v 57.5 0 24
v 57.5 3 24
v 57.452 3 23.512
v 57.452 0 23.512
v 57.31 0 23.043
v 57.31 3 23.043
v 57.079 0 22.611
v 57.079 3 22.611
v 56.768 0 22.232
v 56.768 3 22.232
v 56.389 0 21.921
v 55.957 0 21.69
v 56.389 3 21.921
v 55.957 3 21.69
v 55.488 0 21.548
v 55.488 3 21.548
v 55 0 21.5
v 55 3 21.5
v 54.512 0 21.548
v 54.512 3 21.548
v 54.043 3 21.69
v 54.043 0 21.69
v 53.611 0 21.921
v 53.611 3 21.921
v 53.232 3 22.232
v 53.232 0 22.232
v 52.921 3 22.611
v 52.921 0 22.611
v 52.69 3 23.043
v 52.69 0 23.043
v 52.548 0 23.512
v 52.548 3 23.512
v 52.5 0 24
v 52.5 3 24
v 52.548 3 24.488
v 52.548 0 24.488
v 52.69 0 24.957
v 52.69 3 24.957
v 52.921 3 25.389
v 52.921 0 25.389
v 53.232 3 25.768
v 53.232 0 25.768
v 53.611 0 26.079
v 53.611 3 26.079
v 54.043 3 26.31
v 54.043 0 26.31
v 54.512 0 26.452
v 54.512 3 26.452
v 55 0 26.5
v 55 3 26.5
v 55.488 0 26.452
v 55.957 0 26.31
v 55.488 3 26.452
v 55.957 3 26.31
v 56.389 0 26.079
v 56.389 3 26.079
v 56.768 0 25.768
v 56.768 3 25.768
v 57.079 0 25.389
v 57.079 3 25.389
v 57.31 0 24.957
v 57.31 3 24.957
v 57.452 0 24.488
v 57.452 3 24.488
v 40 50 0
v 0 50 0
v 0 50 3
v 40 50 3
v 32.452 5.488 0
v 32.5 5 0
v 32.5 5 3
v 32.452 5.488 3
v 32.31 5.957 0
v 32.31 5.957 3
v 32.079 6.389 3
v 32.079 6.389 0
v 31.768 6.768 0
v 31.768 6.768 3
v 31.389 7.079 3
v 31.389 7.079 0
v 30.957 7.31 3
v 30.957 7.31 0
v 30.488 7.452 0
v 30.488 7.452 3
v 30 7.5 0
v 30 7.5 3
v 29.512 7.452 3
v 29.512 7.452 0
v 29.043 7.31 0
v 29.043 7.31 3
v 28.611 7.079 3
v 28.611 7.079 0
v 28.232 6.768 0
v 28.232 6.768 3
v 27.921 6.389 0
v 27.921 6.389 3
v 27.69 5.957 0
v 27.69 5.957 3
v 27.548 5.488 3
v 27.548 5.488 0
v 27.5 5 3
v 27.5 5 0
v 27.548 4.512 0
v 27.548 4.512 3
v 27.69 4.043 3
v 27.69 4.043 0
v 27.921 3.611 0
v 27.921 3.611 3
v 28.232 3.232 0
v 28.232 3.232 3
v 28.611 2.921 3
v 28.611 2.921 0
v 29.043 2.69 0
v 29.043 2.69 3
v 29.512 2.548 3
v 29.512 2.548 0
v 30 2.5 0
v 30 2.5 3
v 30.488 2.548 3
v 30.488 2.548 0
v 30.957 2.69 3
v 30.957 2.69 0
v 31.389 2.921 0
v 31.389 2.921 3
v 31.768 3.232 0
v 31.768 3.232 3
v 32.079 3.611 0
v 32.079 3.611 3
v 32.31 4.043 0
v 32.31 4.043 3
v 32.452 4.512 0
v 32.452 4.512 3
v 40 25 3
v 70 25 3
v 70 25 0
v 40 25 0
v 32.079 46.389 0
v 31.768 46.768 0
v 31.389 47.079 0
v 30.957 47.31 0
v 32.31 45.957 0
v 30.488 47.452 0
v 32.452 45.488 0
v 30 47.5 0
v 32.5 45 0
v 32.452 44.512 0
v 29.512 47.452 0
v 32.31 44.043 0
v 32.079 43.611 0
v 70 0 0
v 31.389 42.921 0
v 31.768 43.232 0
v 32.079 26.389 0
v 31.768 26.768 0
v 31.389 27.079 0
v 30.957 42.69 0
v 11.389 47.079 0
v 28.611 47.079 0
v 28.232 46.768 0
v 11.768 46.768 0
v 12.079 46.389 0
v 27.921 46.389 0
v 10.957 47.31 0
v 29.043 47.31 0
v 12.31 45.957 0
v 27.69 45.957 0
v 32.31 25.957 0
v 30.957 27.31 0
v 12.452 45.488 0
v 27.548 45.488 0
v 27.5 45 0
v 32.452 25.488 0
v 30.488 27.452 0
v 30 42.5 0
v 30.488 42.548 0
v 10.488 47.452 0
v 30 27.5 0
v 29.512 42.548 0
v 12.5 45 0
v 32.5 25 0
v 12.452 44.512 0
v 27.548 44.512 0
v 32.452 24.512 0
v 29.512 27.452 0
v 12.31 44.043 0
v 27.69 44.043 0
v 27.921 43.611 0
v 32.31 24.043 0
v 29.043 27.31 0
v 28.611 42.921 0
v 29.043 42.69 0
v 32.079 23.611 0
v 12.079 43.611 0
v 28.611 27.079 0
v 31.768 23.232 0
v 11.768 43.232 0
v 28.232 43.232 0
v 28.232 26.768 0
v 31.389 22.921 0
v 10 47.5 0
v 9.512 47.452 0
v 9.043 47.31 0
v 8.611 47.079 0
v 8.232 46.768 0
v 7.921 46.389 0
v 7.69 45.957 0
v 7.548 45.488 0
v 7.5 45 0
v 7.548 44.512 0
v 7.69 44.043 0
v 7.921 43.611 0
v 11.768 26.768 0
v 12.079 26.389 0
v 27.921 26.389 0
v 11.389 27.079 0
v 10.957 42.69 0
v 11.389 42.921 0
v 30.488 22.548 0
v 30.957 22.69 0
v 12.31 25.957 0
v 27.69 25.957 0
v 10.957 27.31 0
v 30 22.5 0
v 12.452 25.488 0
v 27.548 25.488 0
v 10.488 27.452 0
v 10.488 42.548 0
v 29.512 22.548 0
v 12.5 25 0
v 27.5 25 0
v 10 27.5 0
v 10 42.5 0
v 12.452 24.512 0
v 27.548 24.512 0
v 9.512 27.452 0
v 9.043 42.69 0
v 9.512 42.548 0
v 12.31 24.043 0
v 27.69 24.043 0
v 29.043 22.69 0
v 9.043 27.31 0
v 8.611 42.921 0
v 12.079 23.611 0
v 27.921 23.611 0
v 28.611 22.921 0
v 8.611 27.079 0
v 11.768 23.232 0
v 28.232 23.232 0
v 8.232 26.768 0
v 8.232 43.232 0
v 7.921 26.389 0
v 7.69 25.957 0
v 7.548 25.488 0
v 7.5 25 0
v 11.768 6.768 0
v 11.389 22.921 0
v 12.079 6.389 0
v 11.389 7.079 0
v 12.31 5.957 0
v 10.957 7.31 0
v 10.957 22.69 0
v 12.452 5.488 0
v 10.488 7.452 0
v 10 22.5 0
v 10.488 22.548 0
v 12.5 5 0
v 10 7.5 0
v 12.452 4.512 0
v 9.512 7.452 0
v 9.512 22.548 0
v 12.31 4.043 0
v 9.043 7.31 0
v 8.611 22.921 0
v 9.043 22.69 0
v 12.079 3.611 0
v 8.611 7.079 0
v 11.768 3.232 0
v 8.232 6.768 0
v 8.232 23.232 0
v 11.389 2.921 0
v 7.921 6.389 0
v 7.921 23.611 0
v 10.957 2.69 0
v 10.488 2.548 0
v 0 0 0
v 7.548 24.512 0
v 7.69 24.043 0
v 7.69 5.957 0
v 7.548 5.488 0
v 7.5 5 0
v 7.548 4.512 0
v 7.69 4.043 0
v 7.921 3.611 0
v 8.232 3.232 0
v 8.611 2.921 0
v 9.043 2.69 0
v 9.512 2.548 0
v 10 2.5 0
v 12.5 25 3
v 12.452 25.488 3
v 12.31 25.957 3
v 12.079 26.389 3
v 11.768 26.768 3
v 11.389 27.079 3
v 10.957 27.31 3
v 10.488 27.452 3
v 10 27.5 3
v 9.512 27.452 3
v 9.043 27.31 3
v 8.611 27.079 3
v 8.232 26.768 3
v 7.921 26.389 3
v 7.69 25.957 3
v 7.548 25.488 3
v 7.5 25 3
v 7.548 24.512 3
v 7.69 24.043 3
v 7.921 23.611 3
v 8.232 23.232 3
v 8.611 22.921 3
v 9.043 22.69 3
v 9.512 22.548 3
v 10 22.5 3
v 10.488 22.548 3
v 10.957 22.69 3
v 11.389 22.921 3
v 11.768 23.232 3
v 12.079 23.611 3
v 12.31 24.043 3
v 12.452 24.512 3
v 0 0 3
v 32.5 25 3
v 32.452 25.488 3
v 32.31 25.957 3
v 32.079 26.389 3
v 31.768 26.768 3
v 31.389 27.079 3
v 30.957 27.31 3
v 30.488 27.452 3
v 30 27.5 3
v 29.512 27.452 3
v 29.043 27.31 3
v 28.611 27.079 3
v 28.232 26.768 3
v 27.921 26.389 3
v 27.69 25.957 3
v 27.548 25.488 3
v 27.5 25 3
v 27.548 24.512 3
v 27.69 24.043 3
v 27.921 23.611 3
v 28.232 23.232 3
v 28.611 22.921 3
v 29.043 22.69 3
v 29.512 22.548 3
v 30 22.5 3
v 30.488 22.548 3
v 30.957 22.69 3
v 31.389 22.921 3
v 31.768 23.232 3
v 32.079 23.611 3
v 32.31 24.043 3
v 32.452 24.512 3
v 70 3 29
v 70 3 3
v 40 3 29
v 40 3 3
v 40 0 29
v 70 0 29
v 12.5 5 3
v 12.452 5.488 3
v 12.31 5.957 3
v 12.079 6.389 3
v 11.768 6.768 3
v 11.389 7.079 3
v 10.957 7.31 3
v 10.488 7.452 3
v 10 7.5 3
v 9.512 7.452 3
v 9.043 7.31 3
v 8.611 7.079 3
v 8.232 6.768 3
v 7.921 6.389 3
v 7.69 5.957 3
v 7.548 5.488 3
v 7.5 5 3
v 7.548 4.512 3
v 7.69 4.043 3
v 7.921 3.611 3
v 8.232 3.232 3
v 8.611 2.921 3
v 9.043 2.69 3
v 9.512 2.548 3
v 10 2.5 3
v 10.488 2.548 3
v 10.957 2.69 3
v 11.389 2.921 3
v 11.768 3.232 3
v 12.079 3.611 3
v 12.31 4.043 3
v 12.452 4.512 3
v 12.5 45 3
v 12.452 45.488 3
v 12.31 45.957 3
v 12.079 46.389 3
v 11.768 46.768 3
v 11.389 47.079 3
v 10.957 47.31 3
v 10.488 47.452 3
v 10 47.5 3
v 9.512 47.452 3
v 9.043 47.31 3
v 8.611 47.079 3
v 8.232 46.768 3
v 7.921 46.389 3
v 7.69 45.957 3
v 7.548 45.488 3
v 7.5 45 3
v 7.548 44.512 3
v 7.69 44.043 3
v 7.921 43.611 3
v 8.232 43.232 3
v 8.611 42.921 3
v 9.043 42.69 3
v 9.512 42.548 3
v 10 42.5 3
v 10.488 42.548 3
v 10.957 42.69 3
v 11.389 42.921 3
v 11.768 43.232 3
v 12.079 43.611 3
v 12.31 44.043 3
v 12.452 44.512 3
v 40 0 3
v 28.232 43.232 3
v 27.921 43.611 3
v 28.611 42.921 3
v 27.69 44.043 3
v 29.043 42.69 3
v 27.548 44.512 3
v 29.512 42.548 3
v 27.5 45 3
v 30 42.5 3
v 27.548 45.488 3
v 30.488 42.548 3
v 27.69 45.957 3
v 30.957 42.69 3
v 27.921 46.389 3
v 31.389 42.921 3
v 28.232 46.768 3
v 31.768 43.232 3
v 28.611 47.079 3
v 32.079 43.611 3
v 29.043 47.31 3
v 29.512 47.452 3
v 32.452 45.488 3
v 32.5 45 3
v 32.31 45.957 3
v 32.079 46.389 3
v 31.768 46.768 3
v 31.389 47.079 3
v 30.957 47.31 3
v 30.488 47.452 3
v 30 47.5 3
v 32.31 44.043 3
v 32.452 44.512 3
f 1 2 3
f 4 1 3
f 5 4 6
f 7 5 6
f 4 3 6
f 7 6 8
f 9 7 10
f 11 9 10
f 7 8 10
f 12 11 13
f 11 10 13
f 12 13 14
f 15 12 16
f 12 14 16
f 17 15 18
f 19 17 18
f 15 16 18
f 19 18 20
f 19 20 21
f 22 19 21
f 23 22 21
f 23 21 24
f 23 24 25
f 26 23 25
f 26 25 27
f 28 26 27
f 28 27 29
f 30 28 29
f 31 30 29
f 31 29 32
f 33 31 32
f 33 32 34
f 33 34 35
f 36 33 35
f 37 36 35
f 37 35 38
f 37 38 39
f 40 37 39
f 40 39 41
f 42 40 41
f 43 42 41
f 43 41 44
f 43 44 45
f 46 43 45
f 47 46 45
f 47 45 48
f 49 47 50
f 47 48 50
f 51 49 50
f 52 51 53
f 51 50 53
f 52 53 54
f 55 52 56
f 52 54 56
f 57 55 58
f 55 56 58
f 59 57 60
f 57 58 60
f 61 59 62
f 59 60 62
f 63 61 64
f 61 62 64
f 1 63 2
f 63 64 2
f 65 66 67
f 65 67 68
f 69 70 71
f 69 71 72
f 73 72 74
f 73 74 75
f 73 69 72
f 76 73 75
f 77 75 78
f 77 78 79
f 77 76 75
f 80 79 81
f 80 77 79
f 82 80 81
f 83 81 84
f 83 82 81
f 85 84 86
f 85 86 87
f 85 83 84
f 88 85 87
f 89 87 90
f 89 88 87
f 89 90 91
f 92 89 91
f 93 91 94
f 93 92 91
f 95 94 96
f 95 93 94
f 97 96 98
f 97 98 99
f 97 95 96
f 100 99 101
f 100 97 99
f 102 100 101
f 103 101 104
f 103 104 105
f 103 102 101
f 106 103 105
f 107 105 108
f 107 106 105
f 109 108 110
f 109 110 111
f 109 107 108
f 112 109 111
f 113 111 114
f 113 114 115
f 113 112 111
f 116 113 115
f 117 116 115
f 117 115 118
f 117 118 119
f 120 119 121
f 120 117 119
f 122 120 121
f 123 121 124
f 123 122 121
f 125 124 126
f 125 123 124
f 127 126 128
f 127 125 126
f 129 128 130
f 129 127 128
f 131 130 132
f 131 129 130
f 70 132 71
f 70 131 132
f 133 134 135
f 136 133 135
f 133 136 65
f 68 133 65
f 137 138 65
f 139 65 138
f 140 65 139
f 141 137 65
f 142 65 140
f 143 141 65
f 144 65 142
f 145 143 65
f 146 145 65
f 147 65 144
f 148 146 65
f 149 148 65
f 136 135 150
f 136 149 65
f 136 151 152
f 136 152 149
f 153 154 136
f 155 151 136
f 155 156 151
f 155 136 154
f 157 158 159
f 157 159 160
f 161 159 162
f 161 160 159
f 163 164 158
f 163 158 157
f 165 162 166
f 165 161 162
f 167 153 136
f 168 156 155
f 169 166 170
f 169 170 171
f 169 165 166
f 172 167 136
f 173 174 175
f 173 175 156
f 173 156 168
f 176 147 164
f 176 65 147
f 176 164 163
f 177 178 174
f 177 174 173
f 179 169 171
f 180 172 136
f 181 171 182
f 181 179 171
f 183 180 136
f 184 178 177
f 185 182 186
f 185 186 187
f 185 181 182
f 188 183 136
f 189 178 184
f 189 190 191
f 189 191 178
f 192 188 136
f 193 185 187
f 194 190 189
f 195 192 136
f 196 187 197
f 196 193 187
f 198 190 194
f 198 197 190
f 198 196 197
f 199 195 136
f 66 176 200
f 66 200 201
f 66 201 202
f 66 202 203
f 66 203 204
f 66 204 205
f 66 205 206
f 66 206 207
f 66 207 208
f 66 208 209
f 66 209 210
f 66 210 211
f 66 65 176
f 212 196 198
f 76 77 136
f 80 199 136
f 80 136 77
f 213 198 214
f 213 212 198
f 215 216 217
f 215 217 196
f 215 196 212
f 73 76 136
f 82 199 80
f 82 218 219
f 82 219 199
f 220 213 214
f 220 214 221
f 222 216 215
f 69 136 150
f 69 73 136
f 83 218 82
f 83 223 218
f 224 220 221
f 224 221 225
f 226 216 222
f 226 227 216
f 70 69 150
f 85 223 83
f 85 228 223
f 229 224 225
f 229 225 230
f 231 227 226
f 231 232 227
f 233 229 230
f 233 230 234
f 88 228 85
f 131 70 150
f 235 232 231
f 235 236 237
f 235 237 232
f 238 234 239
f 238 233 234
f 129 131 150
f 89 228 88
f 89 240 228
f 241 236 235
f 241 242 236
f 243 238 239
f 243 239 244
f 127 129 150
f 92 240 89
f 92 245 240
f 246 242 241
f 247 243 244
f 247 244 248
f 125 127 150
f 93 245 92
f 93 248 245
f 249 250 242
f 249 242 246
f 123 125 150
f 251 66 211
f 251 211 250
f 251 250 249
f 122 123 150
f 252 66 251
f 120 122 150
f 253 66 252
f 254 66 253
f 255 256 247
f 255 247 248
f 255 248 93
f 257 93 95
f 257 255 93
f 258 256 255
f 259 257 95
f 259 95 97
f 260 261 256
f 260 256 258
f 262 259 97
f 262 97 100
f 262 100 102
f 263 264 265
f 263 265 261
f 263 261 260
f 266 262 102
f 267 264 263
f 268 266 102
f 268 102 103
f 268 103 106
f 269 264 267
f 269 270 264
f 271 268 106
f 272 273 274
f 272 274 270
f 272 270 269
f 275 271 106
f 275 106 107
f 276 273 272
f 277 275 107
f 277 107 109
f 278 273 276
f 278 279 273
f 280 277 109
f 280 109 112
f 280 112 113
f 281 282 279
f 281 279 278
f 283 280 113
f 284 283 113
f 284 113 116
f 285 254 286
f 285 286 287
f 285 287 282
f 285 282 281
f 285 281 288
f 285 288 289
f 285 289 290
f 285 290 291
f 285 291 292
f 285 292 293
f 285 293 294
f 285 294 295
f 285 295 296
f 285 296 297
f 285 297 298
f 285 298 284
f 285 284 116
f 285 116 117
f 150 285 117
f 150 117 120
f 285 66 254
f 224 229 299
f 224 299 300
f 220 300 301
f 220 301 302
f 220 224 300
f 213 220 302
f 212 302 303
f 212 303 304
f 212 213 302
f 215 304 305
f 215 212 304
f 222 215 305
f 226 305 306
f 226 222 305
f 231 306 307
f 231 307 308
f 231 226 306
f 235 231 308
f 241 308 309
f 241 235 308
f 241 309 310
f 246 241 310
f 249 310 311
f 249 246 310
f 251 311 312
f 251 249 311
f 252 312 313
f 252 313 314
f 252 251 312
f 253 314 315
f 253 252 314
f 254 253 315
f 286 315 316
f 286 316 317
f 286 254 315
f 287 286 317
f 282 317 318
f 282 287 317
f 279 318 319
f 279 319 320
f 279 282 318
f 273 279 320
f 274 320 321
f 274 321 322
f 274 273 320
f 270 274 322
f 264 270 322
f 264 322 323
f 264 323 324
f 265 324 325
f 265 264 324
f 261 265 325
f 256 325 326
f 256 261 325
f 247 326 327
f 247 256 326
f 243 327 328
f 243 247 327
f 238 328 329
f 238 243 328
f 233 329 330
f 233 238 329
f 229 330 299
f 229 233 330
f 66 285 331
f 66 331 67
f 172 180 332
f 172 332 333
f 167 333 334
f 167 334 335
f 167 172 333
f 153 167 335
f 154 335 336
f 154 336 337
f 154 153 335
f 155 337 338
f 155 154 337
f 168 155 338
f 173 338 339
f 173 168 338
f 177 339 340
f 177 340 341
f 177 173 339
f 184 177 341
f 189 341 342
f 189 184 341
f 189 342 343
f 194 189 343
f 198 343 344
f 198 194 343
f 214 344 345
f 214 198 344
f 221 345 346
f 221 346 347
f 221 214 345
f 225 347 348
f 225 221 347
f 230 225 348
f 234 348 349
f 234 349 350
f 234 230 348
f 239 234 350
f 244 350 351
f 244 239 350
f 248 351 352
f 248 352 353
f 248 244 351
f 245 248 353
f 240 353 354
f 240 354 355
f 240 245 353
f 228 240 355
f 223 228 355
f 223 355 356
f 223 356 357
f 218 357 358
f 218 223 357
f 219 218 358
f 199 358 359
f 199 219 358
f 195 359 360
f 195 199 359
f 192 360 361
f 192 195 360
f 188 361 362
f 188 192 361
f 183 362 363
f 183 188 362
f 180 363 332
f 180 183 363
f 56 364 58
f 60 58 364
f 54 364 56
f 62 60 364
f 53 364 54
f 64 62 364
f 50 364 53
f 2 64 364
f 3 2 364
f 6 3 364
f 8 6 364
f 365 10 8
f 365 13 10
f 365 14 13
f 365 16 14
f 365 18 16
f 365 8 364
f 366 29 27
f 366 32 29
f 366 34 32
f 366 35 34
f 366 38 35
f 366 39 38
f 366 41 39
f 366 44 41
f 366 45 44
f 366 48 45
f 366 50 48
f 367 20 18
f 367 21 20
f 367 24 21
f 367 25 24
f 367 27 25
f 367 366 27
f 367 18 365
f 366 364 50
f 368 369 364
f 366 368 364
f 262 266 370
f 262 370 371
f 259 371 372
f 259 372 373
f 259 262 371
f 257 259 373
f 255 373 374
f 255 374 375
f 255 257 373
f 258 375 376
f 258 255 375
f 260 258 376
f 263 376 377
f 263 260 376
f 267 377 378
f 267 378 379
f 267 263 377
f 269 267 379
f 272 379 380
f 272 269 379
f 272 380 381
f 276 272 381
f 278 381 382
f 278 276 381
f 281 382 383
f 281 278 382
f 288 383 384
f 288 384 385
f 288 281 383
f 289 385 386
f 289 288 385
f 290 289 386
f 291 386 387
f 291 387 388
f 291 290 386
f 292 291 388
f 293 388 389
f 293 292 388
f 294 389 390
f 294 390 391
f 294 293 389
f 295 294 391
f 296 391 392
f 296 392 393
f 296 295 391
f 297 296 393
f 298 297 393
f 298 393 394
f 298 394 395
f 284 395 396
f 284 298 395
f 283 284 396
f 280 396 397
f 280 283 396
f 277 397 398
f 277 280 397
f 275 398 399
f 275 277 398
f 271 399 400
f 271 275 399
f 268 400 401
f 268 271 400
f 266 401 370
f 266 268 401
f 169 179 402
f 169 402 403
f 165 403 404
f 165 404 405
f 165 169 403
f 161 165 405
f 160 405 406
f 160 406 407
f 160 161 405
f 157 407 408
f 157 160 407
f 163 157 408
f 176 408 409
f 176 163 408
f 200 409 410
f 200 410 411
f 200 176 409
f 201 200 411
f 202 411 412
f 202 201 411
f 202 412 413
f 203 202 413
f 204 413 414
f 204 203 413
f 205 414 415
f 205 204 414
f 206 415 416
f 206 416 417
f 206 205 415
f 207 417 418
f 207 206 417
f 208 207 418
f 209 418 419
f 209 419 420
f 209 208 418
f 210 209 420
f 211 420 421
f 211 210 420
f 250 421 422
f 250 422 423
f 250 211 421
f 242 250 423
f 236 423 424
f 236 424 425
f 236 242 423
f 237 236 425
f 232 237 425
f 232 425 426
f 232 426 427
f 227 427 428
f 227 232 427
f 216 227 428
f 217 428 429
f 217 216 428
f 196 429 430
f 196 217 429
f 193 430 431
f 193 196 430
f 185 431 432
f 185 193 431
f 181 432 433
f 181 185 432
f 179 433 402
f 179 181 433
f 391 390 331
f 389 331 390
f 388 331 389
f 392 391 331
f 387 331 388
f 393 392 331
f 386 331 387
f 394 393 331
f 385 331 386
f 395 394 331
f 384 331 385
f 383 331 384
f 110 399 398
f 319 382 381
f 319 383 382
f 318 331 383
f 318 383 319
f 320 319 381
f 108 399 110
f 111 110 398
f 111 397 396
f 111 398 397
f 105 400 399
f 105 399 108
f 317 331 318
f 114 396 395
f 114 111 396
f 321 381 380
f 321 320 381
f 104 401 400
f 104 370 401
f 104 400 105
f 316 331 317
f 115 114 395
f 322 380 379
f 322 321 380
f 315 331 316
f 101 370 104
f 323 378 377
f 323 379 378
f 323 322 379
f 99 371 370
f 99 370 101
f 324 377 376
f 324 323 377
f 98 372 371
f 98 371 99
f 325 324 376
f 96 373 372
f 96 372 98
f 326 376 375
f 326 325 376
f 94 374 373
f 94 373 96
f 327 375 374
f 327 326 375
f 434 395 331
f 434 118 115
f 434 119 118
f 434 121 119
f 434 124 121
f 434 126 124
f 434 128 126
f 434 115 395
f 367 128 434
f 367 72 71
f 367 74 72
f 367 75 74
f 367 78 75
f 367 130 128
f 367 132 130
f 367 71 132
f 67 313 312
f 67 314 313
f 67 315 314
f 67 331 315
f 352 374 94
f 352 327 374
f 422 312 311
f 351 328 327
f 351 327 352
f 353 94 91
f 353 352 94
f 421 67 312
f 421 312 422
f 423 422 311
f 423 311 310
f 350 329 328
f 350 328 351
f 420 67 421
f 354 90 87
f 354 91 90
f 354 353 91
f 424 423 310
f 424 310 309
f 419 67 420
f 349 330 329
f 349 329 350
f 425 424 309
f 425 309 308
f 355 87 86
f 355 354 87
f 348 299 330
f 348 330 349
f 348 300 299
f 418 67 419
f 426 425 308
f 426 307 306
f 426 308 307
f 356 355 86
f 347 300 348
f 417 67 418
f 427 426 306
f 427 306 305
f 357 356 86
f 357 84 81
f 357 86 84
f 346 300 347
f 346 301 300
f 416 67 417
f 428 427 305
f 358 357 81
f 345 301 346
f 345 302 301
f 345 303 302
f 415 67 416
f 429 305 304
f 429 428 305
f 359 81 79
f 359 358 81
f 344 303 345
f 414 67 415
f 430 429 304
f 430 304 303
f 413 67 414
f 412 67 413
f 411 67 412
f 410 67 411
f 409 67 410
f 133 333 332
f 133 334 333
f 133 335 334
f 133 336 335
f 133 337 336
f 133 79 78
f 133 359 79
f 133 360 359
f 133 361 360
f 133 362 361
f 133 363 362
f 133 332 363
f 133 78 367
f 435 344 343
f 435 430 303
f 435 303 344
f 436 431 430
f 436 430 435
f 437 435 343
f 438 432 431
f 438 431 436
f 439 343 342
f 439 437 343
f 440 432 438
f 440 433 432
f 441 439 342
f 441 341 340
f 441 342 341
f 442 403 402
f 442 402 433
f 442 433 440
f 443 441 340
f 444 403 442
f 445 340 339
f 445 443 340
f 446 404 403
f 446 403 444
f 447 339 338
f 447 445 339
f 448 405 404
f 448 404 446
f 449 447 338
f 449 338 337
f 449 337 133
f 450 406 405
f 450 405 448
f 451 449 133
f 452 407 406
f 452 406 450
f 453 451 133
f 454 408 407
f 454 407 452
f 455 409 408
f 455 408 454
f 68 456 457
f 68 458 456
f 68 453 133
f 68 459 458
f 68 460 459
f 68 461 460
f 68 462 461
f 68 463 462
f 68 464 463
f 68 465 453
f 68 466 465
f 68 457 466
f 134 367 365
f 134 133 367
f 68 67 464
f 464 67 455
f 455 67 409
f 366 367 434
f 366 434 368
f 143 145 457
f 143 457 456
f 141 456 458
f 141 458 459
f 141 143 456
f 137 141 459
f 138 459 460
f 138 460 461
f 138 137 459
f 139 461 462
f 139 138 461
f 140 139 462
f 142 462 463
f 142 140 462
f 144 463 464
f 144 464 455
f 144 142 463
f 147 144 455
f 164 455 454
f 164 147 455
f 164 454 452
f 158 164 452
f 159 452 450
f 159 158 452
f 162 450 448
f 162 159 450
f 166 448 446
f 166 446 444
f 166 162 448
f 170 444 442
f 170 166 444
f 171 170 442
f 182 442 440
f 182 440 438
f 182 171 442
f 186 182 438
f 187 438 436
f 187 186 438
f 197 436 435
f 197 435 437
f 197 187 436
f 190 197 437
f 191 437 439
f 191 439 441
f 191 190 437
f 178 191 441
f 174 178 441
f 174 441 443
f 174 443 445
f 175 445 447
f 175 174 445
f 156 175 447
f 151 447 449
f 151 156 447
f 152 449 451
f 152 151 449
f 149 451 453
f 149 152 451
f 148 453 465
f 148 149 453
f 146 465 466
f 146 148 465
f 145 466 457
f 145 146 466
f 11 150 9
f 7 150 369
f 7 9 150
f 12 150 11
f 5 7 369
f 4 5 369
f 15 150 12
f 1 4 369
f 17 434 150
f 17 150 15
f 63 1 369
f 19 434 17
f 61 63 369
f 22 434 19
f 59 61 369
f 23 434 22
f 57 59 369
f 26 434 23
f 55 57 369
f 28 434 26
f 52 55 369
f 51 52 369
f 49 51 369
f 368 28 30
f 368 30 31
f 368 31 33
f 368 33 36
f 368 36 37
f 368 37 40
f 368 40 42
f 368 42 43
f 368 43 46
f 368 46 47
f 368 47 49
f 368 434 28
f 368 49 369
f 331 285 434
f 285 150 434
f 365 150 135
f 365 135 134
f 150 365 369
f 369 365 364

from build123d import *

# Parameters (mm, degrees)
SKETCH1_W               = 40
SKETCH1_H               = 50
SKETCH1_R               = 2.5
BOSS_EXTRUDE1_DEPTH     = 3
BOSS_EXTRUDE2_DEPTH     = 30
SKETCH4_R               = 2.5
CUT_EXTRUDE2_DEPTH      = 48
CUT_EXTRUDE2_DEPTH_BACK = 4


with BuildPart() as part:
    # Sketch1 → Boss-Extrude1 (new body)
    with BuildSketch(Plane.XY):
        with Locations((20, 25)):
            Rectangle(SKETCH1_W, SKETCH1_H)
        with Locations((30, 45)):
            Circle(SKETCH1_R, mode=Mode.SUBTRACT)
        with Locations((10, 45)):
            Circle(SKETCH1_R, mode=Mode.SUBTRACT)
        with Locations((10, 25)):
            Circle(SKETCH1_R, mode=Mode.SUBTRACT)
        with Locations((10, 5)):
            Circle(SKETCH1_R, mode=Mode.SUBTRACT)
        with Locations((30, 25)):
            Circle(SKETCH1_R, mode=Mode.SUBTRACT)
        with Locations((30, 5)):
            Circle(SKETCH1_R, mode=Mode.SUBTRACT)
    extrude(amount=BOSS_EXTRUDE1_DEPTH)

    # Sketch2 → Boss-Extrude2 (add)
    with BuildSketch(Plane(origin=(40, 0, 0), x_dir=(0, 0, -1), z_dir=(1, 0, 0))):
        Polygon((0, 0), (-29, 0), (-29, 3), (-3, 3), (-3, 25), (0, 25), align=None)
    extrude(amount=BOSS_EXTRUDE2_DEPTH)

    # Sketch4 → Cut-Extrude2 (cut, two sides)
    with BuildSketch(Plane(origin=(0, 3, 0), x_dir=(1, 0, 0), z_dir=(0, 1, 0))) as cut_extrude2_sk:
        with Locations((55, -24)):
            Circle(SKETCH4_R)
    extrude(amount=CUT_EXTRUDE2_DEPTH, mode=Mode.SUBTRACT)
    extrude(cut_extrude2_sk.sketch, amount=-CUT_EXTRUDE2_DEPTH_BACK, mode=Mode.SUBTRACT)


solid = part.part
